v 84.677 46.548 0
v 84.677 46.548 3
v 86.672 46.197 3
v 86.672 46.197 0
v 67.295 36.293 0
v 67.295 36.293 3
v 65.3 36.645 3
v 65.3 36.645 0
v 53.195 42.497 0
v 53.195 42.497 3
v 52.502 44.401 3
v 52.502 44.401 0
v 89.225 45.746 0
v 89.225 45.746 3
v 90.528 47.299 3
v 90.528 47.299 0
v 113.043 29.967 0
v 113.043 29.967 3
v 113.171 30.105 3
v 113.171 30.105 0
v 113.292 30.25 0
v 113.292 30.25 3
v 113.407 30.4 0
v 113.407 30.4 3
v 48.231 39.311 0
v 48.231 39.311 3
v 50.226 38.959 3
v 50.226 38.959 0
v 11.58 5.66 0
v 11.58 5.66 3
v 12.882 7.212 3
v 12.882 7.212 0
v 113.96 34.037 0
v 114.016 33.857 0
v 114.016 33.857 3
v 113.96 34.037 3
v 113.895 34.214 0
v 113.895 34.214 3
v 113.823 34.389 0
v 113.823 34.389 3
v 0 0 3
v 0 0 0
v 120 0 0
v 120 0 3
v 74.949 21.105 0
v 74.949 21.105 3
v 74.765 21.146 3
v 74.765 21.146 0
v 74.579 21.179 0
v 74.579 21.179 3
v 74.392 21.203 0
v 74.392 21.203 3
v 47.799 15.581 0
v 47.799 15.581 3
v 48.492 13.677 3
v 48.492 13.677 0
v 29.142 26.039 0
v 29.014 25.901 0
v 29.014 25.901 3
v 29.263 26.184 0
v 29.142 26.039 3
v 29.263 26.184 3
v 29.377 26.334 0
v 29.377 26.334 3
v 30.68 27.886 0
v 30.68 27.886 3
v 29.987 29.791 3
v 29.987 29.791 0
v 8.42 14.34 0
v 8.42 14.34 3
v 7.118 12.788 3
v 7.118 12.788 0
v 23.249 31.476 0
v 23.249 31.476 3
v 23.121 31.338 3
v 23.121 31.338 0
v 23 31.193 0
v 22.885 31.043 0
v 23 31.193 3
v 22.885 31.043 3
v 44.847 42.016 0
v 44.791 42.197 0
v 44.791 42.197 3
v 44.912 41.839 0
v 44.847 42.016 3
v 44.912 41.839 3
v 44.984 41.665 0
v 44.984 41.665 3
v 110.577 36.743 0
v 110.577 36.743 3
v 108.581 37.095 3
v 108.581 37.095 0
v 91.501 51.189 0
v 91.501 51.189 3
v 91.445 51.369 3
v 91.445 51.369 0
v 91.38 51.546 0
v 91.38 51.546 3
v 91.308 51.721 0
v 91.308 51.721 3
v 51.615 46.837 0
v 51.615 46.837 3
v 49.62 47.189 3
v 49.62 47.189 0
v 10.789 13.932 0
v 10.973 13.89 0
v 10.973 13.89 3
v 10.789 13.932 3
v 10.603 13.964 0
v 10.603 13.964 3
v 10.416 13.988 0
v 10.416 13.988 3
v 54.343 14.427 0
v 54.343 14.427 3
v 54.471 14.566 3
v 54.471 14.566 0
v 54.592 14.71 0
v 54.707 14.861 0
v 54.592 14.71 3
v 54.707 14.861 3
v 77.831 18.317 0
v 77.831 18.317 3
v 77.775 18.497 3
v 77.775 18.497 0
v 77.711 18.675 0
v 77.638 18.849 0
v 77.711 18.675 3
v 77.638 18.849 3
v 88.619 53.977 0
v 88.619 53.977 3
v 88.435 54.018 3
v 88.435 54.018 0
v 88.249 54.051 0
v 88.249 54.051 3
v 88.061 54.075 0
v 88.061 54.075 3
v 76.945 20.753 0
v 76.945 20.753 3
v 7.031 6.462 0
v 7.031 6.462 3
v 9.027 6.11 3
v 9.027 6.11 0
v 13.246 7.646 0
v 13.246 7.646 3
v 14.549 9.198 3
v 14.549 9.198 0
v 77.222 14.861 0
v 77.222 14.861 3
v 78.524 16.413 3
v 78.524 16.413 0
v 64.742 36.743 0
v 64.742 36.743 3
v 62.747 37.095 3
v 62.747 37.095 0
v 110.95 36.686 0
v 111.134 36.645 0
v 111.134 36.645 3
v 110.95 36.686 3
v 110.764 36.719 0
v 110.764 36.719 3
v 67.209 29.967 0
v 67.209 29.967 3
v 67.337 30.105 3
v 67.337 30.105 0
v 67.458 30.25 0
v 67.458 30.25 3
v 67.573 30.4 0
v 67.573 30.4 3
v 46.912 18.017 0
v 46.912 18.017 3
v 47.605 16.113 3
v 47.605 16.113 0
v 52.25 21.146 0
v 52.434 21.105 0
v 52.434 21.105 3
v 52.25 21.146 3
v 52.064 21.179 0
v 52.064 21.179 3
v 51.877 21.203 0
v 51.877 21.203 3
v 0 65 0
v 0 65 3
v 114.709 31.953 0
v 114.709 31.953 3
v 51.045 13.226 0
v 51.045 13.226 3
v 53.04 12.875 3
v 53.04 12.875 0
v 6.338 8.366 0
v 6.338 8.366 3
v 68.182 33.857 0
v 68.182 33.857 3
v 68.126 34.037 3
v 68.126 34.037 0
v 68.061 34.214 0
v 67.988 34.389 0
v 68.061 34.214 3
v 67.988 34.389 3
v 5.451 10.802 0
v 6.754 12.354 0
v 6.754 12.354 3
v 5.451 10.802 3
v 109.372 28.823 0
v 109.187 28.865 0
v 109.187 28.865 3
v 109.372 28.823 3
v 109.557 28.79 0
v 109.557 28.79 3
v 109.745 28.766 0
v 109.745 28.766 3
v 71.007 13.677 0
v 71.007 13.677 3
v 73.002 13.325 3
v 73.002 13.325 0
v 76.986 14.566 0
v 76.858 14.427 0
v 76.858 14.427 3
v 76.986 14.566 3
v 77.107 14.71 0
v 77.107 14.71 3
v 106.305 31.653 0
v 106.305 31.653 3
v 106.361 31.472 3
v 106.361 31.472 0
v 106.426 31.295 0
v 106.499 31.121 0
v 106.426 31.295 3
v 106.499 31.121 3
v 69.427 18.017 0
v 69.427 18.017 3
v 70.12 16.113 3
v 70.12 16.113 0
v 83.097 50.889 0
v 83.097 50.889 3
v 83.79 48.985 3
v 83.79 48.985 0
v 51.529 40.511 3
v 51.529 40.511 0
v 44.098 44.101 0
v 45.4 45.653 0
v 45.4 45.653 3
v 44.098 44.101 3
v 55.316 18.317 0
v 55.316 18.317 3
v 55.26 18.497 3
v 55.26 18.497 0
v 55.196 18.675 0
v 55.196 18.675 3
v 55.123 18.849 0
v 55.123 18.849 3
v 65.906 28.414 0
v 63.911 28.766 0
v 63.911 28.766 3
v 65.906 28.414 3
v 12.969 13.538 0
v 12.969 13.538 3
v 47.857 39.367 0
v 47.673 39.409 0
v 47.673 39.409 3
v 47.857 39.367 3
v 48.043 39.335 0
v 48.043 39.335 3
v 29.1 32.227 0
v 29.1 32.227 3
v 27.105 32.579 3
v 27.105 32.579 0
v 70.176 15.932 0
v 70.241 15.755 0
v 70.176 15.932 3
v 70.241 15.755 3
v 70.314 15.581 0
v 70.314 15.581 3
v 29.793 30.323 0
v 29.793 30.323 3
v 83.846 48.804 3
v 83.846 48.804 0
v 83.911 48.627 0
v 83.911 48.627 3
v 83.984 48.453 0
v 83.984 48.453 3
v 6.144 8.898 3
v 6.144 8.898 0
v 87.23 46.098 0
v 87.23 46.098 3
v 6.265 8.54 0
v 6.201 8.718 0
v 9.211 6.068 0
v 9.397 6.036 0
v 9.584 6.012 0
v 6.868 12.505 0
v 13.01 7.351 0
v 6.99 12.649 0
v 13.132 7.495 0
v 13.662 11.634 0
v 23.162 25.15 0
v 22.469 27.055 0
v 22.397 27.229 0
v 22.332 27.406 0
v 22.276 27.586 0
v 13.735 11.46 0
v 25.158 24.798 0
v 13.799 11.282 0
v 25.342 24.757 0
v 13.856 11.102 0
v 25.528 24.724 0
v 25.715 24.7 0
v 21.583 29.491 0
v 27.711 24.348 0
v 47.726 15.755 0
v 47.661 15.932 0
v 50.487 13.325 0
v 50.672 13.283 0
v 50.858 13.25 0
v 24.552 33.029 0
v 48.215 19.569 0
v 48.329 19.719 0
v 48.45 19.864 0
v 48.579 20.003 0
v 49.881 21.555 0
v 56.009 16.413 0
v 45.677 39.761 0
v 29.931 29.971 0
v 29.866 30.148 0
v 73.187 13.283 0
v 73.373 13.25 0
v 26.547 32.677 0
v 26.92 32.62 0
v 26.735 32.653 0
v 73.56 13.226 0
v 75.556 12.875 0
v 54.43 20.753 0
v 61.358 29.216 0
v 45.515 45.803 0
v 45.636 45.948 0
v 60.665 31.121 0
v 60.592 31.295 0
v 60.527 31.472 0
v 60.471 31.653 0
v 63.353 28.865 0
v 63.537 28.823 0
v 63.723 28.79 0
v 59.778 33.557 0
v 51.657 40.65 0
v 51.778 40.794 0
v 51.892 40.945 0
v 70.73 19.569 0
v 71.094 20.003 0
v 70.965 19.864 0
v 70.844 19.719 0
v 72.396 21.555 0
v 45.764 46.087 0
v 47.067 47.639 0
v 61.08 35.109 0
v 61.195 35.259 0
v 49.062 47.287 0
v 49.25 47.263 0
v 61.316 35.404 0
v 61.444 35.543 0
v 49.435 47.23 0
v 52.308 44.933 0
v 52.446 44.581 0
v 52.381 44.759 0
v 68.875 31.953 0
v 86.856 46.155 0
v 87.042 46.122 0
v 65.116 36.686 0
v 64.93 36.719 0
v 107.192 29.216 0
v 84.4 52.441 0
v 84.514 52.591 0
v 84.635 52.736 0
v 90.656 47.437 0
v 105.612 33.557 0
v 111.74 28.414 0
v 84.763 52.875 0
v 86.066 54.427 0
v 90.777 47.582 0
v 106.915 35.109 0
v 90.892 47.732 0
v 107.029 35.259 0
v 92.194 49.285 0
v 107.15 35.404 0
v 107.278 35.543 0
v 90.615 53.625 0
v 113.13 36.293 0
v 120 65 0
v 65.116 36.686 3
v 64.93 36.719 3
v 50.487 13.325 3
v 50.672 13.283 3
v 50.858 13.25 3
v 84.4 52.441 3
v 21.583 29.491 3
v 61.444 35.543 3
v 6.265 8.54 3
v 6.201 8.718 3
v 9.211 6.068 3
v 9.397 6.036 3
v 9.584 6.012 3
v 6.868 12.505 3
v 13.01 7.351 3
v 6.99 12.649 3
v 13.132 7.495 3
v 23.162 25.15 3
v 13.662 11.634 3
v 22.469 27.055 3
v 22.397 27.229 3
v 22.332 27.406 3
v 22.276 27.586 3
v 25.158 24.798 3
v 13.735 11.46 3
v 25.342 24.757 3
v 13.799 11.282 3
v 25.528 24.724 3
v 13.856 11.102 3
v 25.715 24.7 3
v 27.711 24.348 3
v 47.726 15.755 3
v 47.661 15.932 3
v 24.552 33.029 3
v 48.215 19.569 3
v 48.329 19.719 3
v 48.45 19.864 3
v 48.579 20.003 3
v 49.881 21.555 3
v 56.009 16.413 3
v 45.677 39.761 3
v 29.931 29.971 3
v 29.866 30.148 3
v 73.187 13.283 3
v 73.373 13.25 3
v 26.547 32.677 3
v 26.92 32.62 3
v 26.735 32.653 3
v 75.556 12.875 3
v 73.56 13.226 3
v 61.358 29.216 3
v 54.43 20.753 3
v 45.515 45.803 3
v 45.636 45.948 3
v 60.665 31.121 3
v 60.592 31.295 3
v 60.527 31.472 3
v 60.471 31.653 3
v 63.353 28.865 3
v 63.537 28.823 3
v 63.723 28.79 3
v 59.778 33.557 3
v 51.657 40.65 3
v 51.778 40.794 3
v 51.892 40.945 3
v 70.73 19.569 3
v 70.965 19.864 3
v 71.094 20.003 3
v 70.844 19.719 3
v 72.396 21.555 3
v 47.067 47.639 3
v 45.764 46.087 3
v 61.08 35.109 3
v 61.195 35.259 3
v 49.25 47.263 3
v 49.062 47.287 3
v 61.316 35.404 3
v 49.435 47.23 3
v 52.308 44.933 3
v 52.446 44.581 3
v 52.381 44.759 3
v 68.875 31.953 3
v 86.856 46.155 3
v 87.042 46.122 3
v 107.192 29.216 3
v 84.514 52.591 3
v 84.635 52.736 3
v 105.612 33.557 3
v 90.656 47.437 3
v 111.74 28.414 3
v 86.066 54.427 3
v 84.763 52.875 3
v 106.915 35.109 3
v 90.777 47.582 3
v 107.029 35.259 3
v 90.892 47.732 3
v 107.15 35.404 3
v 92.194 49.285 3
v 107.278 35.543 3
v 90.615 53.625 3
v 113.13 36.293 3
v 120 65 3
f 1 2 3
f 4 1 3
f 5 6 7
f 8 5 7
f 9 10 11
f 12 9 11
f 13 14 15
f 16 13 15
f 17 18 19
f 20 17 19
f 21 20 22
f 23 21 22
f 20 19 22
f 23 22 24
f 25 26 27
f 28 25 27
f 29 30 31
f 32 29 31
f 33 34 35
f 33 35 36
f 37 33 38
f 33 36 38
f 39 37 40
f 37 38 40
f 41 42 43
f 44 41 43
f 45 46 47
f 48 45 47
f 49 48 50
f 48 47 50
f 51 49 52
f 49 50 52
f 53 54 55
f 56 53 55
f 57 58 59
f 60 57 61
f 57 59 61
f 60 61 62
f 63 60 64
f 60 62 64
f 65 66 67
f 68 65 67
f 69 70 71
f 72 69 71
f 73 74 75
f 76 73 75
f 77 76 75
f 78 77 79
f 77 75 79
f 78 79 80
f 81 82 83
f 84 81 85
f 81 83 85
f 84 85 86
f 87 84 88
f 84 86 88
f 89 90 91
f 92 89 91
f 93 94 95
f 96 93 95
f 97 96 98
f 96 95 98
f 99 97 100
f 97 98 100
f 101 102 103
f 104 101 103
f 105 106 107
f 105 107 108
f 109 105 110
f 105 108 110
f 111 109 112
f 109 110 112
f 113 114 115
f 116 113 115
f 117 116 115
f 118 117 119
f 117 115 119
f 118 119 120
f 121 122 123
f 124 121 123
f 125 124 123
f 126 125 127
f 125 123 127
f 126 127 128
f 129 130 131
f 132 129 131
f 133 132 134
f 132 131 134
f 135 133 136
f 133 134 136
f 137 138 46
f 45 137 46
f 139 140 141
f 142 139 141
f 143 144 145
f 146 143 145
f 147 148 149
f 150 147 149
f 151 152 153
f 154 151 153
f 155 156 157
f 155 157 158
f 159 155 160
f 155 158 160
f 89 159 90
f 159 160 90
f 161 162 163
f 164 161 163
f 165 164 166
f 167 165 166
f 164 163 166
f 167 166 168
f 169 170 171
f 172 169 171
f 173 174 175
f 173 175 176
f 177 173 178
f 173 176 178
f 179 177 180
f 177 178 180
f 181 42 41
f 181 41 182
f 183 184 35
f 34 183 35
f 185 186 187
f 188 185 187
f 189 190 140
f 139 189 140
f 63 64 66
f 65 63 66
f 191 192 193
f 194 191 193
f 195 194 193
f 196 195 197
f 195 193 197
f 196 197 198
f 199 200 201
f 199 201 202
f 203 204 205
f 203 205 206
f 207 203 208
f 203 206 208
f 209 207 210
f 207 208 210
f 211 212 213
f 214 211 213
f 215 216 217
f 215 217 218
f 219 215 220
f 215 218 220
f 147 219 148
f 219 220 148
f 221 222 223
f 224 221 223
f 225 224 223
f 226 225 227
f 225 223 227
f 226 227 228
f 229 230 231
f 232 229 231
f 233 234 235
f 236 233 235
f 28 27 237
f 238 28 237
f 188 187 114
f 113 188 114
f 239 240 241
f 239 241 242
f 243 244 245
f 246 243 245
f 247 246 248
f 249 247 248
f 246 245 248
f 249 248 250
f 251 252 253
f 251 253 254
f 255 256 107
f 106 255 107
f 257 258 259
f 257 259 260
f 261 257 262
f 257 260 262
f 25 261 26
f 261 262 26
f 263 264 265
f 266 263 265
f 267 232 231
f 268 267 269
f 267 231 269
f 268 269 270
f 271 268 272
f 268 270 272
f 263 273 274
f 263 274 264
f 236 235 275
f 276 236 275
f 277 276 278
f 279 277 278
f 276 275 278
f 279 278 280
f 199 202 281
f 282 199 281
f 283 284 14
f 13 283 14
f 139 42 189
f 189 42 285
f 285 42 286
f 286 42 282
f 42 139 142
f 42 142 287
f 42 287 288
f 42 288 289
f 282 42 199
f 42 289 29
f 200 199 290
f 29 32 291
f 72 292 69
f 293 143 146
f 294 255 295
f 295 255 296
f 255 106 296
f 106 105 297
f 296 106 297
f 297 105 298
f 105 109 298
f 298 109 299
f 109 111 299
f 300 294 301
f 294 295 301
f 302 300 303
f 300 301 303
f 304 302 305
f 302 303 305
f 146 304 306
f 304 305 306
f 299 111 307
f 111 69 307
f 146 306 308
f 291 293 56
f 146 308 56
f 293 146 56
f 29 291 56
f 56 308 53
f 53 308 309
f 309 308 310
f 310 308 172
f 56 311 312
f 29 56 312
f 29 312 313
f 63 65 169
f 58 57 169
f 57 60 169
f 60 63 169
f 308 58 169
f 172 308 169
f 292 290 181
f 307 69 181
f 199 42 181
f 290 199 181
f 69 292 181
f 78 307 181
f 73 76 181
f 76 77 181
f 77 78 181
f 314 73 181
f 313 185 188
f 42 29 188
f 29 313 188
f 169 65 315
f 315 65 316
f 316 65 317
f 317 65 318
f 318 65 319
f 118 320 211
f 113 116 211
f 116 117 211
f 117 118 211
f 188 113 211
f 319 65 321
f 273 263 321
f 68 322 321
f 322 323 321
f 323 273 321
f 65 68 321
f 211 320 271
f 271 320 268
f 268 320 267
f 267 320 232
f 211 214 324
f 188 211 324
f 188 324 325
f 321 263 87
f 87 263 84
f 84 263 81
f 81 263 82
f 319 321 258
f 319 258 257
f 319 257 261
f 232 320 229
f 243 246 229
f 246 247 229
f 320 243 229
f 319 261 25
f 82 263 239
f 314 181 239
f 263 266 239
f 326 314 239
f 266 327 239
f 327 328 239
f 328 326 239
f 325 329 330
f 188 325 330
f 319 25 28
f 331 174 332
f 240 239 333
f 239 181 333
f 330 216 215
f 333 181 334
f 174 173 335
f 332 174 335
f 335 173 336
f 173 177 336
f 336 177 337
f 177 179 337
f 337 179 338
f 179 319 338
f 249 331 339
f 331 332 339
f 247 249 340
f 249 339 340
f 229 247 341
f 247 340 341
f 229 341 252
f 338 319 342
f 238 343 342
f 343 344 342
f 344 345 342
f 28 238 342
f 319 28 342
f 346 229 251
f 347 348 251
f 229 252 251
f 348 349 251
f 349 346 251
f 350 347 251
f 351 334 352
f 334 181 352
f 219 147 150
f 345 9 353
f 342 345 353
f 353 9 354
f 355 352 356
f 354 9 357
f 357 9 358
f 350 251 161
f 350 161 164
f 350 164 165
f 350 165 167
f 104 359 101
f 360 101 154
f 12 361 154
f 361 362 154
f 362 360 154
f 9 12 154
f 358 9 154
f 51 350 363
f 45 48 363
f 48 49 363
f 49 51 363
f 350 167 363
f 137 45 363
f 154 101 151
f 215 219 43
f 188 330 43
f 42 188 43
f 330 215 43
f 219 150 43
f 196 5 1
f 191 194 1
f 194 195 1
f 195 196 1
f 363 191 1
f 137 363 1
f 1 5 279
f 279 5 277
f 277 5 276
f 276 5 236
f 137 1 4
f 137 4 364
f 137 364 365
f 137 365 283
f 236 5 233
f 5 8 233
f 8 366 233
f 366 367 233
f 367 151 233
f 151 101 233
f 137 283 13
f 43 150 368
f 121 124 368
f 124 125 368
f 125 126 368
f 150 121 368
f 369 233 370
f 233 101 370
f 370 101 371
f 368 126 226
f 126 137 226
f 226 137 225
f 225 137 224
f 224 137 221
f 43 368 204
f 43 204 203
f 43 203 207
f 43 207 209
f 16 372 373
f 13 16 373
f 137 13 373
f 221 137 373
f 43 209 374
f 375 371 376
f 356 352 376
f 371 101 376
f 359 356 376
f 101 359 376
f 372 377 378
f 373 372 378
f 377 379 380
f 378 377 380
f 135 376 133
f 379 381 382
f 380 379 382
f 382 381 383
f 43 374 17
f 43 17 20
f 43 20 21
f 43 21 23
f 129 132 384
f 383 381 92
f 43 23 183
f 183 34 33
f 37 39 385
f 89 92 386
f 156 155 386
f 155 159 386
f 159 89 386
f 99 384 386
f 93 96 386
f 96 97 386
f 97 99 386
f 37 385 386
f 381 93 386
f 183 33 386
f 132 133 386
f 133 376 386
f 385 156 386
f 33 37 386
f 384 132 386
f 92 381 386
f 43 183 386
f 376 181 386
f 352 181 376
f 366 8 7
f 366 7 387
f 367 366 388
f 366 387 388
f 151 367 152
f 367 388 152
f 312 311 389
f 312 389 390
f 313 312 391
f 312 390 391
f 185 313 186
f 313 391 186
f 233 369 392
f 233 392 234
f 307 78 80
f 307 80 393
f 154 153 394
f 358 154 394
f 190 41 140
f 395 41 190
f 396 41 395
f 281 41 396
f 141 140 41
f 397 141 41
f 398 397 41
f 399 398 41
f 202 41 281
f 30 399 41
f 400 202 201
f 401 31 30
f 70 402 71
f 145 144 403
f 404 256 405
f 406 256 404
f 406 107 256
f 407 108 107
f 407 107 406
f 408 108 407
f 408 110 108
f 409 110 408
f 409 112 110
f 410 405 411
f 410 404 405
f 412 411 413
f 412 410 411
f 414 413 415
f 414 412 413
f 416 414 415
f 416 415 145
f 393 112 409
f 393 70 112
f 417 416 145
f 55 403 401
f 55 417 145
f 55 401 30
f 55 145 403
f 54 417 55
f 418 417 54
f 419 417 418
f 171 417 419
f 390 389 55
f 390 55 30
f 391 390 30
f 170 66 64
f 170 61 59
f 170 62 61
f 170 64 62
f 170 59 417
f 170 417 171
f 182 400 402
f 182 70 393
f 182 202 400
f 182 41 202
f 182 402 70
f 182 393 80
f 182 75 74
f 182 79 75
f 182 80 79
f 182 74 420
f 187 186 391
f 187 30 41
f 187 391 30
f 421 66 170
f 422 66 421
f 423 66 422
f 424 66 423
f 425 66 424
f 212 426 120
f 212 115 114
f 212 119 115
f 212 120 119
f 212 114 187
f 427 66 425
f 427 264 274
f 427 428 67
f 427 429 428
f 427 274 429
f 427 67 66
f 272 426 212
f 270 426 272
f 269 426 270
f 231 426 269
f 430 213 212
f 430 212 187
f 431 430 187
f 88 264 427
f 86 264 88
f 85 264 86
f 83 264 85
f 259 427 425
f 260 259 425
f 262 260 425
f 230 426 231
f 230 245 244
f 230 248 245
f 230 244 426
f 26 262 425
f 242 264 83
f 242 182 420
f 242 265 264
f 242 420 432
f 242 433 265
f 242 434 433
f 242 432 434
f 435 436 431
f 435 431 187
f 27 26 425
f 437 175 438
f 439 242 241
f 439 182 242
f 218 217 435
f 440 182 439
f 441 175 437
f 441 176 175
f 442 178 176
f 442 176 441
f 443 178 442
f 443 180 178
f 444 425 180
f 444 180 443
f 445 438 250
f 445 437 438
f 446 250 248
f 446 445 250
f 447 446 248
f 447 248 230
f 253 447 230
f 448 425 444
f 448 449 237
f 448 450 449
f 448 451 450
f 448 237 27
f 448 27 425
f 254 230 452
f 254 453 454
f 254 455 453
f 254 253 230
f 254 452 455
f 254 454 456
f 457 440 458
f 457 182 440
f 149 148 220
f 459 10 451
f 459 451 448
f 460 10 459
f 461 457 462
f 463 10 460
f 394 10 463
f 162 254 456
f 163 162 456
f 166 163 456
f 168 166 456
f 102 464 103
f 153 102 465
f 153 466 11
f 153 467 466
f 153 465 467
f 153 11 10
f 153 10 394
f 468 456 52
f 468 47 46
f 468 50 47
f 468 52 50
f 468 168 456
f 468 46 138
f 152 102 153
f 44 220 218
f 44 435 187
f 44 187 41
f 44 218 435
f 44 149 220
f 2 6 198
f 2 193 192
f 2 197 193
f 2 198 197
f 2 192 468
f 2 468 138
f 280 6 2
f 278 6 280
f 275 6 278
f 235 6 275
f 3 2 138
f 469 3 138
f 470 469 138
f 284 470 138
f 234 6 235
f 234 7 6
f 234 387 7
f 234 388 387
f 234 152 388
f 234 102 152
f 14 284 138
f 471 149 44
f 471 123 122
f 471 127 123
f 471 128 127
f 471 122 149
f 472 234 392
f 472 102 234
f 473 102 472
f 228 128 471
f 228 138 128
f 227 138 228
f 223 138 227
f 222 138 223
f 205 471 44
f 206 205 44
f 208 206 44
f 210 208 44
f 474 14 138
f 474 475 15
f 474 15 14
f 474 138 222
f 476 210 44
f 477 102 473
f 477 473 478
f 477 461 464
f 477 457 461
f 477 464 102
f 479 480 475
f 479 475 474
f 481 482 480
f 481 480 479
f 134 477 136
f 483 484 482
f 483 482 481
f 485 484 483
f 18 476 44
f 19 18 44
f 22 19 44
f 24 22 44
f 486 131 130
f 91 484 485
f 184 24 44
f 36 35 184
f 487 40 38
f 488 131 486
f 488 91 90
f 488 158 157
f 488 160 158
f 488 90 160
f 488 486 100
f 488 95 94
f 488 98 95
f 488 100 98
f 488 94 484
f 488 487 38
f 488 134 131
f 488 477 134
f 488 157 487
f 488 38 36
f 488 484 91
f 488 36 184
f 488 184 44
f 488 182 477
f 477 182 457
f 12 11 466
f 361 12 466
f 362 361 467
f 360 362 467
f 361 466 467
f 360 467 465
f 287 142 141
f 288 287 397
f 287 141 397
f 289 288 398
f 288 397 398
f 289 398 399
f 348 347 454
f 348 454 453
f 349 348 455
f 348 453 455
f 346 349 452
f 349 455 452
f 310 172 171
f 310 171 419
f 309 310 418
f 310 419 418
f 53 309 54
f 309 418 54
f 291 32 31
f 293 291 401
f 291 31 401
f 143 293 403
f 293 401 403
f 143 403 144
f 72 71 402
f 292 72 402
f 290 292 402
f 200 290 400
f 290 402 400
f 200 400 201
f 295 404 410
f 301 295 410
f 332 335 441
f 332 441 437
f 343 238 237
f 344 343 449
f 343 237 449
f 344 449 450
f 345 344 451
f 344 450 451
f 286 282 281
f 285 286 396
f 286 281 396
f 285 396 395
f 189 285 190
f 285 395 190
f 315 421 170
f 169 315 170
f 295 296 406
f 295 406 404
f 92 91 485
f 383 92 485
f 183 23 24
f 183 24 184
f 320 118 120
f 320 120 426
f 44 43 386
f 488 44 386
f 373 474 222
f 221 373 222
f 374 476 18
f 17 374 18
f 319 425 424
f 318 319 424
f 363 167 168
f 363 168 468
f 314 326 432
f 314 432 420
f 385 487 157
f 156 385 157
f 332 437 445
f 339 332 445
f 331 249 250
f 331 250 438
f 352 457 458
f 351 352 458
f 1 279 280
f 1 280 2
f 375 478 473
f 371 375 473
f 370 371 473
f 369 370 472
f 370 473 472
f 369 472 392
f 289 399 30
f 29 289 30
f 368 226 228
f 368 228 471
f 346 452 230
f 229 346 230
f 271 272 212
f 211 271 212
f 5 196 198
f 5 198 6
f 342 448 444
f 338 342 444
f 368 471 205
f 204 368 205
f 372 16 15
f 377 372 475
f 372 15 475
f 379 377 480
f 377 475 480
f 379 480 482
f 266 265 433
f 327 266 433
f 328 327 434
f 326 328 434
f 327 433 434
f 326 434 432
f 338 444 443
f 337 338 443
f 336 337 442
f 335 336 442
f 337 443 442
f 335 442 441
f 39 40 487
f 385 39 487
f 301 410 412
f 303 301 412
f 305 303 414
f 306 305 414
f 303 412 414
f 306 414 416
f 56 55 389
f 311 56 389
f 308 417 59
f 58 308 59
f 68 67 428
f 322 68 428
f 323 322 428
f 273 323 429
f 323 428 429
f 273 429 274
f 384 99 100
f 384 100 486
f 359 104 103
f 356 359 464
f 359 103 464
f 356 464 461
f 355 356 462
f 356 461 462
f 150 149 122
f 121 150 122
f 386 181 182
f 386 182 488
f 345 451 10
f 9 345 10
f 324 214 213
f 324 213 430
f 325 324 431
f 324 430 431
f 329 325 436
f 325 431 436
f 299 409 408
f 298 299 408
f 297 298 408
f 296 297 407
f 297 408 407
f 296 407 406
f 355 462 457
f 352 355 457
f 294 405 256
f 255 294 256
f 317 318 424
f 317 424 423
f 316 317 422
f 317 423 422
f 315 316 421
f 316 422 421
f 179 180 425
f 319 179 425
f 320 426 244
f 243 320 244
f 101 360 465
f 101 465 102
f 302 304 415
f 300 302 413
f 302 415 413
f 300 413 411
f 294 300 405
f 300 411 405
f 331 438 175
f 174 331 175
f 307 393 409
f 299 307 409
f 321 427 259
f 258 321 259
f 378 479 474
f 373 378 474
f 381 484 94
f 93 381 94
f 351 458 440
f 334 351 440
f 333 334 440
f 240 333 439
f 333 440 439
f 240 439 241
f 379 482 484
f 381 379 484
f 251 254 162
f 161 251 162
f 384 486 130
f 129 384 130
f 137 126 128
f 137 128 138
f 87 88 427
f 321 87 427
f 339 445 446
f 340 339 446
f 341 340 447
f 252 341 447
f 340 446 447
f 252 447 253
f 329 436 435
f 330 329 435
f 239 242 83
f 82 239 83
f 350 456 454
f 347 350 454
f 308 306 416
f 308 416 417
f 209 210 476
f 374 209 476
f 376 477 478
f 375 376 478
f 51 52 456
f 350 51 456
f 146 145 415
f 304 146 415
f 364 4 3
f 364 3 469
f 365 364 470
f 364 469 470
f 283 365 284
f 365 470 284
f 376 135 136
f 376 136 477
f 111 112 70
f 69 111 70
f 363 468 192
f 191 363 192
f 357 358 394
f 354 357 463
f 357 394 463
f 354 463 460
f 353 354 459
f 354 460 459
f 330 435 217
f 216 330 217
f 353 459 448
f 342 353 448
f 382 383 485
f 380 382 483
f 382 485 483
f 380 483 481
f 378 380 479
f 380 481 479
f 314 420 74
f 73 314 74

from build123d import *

# Parameters (mm, degrees)
SKIZZE1_W                       = 120
SKIZZE1_H                       = 65
AUFSATZ_LINEAR_AUSTRAGEN1_DEPTH = 3
SECHSKANT_DEPTH                 = 4
SKIZZE3_R                       = 4.01
ZYLINDERBOHRUNG_DEPTH           = 4


with BuildPart() as part:
    # Skizze1 → Aufsatz-Linear austragen1 (new body)
    with BuildSketch(Plane.XY):
        with Locations((60, 32.5)):
            Rectangle(SKIZZE1_W, SKIZZE1_H)
    extrude(amount=AUFSATZ_LINEAR_AUSTRAGEN1_DEPTH)

    # Skizze2 → Sechskant (cut, through all)
    with BuildSketch(Plane.XY.offset(3)):
        Polygon((12.968908796, 13.538207724), (8.420276625, 14.340254301), (5.45136783, 10.802046577), (7.031091204, 6.461792276), (11.579723375, 5.659745699), (14.54863217, 9.197953423), align=None)
    sechskant = extrude(amount=-SECHSKANT_DEPTH, mode=Mode.SUBTRACT)

    # Skizze3 → Zylinderbohrung (cut, through all)
    with BuildSketch(Plane.XY.offset(3)):
        with Locations((10, 10)):
            Circle(SKIZZE3_R)
    zylinderbohrung = extrude(amount=-ZYLINDERBOHRUNG_DEPTH, mode=Mode.SUBTRACT)

    # Skizzen-Muster1: Sechskant, Zylinderbohrung at 7 more places
    with Locations((16.131362, 18.688541, 0), (38.646381, 33.298896, 0), (63.975777, 7.214865, 0), (77.645609, 40.086657, 0), (100.160628, 22.754647, 0), (41.460758, 7.214865, 0), (54.326483, 22.754647, 0)):
        add(sechskant, mode=Mode.SUBTRACT)
        add(zylinderbohrung, mode=Mode.SUBTRACT)


solid = part.part
